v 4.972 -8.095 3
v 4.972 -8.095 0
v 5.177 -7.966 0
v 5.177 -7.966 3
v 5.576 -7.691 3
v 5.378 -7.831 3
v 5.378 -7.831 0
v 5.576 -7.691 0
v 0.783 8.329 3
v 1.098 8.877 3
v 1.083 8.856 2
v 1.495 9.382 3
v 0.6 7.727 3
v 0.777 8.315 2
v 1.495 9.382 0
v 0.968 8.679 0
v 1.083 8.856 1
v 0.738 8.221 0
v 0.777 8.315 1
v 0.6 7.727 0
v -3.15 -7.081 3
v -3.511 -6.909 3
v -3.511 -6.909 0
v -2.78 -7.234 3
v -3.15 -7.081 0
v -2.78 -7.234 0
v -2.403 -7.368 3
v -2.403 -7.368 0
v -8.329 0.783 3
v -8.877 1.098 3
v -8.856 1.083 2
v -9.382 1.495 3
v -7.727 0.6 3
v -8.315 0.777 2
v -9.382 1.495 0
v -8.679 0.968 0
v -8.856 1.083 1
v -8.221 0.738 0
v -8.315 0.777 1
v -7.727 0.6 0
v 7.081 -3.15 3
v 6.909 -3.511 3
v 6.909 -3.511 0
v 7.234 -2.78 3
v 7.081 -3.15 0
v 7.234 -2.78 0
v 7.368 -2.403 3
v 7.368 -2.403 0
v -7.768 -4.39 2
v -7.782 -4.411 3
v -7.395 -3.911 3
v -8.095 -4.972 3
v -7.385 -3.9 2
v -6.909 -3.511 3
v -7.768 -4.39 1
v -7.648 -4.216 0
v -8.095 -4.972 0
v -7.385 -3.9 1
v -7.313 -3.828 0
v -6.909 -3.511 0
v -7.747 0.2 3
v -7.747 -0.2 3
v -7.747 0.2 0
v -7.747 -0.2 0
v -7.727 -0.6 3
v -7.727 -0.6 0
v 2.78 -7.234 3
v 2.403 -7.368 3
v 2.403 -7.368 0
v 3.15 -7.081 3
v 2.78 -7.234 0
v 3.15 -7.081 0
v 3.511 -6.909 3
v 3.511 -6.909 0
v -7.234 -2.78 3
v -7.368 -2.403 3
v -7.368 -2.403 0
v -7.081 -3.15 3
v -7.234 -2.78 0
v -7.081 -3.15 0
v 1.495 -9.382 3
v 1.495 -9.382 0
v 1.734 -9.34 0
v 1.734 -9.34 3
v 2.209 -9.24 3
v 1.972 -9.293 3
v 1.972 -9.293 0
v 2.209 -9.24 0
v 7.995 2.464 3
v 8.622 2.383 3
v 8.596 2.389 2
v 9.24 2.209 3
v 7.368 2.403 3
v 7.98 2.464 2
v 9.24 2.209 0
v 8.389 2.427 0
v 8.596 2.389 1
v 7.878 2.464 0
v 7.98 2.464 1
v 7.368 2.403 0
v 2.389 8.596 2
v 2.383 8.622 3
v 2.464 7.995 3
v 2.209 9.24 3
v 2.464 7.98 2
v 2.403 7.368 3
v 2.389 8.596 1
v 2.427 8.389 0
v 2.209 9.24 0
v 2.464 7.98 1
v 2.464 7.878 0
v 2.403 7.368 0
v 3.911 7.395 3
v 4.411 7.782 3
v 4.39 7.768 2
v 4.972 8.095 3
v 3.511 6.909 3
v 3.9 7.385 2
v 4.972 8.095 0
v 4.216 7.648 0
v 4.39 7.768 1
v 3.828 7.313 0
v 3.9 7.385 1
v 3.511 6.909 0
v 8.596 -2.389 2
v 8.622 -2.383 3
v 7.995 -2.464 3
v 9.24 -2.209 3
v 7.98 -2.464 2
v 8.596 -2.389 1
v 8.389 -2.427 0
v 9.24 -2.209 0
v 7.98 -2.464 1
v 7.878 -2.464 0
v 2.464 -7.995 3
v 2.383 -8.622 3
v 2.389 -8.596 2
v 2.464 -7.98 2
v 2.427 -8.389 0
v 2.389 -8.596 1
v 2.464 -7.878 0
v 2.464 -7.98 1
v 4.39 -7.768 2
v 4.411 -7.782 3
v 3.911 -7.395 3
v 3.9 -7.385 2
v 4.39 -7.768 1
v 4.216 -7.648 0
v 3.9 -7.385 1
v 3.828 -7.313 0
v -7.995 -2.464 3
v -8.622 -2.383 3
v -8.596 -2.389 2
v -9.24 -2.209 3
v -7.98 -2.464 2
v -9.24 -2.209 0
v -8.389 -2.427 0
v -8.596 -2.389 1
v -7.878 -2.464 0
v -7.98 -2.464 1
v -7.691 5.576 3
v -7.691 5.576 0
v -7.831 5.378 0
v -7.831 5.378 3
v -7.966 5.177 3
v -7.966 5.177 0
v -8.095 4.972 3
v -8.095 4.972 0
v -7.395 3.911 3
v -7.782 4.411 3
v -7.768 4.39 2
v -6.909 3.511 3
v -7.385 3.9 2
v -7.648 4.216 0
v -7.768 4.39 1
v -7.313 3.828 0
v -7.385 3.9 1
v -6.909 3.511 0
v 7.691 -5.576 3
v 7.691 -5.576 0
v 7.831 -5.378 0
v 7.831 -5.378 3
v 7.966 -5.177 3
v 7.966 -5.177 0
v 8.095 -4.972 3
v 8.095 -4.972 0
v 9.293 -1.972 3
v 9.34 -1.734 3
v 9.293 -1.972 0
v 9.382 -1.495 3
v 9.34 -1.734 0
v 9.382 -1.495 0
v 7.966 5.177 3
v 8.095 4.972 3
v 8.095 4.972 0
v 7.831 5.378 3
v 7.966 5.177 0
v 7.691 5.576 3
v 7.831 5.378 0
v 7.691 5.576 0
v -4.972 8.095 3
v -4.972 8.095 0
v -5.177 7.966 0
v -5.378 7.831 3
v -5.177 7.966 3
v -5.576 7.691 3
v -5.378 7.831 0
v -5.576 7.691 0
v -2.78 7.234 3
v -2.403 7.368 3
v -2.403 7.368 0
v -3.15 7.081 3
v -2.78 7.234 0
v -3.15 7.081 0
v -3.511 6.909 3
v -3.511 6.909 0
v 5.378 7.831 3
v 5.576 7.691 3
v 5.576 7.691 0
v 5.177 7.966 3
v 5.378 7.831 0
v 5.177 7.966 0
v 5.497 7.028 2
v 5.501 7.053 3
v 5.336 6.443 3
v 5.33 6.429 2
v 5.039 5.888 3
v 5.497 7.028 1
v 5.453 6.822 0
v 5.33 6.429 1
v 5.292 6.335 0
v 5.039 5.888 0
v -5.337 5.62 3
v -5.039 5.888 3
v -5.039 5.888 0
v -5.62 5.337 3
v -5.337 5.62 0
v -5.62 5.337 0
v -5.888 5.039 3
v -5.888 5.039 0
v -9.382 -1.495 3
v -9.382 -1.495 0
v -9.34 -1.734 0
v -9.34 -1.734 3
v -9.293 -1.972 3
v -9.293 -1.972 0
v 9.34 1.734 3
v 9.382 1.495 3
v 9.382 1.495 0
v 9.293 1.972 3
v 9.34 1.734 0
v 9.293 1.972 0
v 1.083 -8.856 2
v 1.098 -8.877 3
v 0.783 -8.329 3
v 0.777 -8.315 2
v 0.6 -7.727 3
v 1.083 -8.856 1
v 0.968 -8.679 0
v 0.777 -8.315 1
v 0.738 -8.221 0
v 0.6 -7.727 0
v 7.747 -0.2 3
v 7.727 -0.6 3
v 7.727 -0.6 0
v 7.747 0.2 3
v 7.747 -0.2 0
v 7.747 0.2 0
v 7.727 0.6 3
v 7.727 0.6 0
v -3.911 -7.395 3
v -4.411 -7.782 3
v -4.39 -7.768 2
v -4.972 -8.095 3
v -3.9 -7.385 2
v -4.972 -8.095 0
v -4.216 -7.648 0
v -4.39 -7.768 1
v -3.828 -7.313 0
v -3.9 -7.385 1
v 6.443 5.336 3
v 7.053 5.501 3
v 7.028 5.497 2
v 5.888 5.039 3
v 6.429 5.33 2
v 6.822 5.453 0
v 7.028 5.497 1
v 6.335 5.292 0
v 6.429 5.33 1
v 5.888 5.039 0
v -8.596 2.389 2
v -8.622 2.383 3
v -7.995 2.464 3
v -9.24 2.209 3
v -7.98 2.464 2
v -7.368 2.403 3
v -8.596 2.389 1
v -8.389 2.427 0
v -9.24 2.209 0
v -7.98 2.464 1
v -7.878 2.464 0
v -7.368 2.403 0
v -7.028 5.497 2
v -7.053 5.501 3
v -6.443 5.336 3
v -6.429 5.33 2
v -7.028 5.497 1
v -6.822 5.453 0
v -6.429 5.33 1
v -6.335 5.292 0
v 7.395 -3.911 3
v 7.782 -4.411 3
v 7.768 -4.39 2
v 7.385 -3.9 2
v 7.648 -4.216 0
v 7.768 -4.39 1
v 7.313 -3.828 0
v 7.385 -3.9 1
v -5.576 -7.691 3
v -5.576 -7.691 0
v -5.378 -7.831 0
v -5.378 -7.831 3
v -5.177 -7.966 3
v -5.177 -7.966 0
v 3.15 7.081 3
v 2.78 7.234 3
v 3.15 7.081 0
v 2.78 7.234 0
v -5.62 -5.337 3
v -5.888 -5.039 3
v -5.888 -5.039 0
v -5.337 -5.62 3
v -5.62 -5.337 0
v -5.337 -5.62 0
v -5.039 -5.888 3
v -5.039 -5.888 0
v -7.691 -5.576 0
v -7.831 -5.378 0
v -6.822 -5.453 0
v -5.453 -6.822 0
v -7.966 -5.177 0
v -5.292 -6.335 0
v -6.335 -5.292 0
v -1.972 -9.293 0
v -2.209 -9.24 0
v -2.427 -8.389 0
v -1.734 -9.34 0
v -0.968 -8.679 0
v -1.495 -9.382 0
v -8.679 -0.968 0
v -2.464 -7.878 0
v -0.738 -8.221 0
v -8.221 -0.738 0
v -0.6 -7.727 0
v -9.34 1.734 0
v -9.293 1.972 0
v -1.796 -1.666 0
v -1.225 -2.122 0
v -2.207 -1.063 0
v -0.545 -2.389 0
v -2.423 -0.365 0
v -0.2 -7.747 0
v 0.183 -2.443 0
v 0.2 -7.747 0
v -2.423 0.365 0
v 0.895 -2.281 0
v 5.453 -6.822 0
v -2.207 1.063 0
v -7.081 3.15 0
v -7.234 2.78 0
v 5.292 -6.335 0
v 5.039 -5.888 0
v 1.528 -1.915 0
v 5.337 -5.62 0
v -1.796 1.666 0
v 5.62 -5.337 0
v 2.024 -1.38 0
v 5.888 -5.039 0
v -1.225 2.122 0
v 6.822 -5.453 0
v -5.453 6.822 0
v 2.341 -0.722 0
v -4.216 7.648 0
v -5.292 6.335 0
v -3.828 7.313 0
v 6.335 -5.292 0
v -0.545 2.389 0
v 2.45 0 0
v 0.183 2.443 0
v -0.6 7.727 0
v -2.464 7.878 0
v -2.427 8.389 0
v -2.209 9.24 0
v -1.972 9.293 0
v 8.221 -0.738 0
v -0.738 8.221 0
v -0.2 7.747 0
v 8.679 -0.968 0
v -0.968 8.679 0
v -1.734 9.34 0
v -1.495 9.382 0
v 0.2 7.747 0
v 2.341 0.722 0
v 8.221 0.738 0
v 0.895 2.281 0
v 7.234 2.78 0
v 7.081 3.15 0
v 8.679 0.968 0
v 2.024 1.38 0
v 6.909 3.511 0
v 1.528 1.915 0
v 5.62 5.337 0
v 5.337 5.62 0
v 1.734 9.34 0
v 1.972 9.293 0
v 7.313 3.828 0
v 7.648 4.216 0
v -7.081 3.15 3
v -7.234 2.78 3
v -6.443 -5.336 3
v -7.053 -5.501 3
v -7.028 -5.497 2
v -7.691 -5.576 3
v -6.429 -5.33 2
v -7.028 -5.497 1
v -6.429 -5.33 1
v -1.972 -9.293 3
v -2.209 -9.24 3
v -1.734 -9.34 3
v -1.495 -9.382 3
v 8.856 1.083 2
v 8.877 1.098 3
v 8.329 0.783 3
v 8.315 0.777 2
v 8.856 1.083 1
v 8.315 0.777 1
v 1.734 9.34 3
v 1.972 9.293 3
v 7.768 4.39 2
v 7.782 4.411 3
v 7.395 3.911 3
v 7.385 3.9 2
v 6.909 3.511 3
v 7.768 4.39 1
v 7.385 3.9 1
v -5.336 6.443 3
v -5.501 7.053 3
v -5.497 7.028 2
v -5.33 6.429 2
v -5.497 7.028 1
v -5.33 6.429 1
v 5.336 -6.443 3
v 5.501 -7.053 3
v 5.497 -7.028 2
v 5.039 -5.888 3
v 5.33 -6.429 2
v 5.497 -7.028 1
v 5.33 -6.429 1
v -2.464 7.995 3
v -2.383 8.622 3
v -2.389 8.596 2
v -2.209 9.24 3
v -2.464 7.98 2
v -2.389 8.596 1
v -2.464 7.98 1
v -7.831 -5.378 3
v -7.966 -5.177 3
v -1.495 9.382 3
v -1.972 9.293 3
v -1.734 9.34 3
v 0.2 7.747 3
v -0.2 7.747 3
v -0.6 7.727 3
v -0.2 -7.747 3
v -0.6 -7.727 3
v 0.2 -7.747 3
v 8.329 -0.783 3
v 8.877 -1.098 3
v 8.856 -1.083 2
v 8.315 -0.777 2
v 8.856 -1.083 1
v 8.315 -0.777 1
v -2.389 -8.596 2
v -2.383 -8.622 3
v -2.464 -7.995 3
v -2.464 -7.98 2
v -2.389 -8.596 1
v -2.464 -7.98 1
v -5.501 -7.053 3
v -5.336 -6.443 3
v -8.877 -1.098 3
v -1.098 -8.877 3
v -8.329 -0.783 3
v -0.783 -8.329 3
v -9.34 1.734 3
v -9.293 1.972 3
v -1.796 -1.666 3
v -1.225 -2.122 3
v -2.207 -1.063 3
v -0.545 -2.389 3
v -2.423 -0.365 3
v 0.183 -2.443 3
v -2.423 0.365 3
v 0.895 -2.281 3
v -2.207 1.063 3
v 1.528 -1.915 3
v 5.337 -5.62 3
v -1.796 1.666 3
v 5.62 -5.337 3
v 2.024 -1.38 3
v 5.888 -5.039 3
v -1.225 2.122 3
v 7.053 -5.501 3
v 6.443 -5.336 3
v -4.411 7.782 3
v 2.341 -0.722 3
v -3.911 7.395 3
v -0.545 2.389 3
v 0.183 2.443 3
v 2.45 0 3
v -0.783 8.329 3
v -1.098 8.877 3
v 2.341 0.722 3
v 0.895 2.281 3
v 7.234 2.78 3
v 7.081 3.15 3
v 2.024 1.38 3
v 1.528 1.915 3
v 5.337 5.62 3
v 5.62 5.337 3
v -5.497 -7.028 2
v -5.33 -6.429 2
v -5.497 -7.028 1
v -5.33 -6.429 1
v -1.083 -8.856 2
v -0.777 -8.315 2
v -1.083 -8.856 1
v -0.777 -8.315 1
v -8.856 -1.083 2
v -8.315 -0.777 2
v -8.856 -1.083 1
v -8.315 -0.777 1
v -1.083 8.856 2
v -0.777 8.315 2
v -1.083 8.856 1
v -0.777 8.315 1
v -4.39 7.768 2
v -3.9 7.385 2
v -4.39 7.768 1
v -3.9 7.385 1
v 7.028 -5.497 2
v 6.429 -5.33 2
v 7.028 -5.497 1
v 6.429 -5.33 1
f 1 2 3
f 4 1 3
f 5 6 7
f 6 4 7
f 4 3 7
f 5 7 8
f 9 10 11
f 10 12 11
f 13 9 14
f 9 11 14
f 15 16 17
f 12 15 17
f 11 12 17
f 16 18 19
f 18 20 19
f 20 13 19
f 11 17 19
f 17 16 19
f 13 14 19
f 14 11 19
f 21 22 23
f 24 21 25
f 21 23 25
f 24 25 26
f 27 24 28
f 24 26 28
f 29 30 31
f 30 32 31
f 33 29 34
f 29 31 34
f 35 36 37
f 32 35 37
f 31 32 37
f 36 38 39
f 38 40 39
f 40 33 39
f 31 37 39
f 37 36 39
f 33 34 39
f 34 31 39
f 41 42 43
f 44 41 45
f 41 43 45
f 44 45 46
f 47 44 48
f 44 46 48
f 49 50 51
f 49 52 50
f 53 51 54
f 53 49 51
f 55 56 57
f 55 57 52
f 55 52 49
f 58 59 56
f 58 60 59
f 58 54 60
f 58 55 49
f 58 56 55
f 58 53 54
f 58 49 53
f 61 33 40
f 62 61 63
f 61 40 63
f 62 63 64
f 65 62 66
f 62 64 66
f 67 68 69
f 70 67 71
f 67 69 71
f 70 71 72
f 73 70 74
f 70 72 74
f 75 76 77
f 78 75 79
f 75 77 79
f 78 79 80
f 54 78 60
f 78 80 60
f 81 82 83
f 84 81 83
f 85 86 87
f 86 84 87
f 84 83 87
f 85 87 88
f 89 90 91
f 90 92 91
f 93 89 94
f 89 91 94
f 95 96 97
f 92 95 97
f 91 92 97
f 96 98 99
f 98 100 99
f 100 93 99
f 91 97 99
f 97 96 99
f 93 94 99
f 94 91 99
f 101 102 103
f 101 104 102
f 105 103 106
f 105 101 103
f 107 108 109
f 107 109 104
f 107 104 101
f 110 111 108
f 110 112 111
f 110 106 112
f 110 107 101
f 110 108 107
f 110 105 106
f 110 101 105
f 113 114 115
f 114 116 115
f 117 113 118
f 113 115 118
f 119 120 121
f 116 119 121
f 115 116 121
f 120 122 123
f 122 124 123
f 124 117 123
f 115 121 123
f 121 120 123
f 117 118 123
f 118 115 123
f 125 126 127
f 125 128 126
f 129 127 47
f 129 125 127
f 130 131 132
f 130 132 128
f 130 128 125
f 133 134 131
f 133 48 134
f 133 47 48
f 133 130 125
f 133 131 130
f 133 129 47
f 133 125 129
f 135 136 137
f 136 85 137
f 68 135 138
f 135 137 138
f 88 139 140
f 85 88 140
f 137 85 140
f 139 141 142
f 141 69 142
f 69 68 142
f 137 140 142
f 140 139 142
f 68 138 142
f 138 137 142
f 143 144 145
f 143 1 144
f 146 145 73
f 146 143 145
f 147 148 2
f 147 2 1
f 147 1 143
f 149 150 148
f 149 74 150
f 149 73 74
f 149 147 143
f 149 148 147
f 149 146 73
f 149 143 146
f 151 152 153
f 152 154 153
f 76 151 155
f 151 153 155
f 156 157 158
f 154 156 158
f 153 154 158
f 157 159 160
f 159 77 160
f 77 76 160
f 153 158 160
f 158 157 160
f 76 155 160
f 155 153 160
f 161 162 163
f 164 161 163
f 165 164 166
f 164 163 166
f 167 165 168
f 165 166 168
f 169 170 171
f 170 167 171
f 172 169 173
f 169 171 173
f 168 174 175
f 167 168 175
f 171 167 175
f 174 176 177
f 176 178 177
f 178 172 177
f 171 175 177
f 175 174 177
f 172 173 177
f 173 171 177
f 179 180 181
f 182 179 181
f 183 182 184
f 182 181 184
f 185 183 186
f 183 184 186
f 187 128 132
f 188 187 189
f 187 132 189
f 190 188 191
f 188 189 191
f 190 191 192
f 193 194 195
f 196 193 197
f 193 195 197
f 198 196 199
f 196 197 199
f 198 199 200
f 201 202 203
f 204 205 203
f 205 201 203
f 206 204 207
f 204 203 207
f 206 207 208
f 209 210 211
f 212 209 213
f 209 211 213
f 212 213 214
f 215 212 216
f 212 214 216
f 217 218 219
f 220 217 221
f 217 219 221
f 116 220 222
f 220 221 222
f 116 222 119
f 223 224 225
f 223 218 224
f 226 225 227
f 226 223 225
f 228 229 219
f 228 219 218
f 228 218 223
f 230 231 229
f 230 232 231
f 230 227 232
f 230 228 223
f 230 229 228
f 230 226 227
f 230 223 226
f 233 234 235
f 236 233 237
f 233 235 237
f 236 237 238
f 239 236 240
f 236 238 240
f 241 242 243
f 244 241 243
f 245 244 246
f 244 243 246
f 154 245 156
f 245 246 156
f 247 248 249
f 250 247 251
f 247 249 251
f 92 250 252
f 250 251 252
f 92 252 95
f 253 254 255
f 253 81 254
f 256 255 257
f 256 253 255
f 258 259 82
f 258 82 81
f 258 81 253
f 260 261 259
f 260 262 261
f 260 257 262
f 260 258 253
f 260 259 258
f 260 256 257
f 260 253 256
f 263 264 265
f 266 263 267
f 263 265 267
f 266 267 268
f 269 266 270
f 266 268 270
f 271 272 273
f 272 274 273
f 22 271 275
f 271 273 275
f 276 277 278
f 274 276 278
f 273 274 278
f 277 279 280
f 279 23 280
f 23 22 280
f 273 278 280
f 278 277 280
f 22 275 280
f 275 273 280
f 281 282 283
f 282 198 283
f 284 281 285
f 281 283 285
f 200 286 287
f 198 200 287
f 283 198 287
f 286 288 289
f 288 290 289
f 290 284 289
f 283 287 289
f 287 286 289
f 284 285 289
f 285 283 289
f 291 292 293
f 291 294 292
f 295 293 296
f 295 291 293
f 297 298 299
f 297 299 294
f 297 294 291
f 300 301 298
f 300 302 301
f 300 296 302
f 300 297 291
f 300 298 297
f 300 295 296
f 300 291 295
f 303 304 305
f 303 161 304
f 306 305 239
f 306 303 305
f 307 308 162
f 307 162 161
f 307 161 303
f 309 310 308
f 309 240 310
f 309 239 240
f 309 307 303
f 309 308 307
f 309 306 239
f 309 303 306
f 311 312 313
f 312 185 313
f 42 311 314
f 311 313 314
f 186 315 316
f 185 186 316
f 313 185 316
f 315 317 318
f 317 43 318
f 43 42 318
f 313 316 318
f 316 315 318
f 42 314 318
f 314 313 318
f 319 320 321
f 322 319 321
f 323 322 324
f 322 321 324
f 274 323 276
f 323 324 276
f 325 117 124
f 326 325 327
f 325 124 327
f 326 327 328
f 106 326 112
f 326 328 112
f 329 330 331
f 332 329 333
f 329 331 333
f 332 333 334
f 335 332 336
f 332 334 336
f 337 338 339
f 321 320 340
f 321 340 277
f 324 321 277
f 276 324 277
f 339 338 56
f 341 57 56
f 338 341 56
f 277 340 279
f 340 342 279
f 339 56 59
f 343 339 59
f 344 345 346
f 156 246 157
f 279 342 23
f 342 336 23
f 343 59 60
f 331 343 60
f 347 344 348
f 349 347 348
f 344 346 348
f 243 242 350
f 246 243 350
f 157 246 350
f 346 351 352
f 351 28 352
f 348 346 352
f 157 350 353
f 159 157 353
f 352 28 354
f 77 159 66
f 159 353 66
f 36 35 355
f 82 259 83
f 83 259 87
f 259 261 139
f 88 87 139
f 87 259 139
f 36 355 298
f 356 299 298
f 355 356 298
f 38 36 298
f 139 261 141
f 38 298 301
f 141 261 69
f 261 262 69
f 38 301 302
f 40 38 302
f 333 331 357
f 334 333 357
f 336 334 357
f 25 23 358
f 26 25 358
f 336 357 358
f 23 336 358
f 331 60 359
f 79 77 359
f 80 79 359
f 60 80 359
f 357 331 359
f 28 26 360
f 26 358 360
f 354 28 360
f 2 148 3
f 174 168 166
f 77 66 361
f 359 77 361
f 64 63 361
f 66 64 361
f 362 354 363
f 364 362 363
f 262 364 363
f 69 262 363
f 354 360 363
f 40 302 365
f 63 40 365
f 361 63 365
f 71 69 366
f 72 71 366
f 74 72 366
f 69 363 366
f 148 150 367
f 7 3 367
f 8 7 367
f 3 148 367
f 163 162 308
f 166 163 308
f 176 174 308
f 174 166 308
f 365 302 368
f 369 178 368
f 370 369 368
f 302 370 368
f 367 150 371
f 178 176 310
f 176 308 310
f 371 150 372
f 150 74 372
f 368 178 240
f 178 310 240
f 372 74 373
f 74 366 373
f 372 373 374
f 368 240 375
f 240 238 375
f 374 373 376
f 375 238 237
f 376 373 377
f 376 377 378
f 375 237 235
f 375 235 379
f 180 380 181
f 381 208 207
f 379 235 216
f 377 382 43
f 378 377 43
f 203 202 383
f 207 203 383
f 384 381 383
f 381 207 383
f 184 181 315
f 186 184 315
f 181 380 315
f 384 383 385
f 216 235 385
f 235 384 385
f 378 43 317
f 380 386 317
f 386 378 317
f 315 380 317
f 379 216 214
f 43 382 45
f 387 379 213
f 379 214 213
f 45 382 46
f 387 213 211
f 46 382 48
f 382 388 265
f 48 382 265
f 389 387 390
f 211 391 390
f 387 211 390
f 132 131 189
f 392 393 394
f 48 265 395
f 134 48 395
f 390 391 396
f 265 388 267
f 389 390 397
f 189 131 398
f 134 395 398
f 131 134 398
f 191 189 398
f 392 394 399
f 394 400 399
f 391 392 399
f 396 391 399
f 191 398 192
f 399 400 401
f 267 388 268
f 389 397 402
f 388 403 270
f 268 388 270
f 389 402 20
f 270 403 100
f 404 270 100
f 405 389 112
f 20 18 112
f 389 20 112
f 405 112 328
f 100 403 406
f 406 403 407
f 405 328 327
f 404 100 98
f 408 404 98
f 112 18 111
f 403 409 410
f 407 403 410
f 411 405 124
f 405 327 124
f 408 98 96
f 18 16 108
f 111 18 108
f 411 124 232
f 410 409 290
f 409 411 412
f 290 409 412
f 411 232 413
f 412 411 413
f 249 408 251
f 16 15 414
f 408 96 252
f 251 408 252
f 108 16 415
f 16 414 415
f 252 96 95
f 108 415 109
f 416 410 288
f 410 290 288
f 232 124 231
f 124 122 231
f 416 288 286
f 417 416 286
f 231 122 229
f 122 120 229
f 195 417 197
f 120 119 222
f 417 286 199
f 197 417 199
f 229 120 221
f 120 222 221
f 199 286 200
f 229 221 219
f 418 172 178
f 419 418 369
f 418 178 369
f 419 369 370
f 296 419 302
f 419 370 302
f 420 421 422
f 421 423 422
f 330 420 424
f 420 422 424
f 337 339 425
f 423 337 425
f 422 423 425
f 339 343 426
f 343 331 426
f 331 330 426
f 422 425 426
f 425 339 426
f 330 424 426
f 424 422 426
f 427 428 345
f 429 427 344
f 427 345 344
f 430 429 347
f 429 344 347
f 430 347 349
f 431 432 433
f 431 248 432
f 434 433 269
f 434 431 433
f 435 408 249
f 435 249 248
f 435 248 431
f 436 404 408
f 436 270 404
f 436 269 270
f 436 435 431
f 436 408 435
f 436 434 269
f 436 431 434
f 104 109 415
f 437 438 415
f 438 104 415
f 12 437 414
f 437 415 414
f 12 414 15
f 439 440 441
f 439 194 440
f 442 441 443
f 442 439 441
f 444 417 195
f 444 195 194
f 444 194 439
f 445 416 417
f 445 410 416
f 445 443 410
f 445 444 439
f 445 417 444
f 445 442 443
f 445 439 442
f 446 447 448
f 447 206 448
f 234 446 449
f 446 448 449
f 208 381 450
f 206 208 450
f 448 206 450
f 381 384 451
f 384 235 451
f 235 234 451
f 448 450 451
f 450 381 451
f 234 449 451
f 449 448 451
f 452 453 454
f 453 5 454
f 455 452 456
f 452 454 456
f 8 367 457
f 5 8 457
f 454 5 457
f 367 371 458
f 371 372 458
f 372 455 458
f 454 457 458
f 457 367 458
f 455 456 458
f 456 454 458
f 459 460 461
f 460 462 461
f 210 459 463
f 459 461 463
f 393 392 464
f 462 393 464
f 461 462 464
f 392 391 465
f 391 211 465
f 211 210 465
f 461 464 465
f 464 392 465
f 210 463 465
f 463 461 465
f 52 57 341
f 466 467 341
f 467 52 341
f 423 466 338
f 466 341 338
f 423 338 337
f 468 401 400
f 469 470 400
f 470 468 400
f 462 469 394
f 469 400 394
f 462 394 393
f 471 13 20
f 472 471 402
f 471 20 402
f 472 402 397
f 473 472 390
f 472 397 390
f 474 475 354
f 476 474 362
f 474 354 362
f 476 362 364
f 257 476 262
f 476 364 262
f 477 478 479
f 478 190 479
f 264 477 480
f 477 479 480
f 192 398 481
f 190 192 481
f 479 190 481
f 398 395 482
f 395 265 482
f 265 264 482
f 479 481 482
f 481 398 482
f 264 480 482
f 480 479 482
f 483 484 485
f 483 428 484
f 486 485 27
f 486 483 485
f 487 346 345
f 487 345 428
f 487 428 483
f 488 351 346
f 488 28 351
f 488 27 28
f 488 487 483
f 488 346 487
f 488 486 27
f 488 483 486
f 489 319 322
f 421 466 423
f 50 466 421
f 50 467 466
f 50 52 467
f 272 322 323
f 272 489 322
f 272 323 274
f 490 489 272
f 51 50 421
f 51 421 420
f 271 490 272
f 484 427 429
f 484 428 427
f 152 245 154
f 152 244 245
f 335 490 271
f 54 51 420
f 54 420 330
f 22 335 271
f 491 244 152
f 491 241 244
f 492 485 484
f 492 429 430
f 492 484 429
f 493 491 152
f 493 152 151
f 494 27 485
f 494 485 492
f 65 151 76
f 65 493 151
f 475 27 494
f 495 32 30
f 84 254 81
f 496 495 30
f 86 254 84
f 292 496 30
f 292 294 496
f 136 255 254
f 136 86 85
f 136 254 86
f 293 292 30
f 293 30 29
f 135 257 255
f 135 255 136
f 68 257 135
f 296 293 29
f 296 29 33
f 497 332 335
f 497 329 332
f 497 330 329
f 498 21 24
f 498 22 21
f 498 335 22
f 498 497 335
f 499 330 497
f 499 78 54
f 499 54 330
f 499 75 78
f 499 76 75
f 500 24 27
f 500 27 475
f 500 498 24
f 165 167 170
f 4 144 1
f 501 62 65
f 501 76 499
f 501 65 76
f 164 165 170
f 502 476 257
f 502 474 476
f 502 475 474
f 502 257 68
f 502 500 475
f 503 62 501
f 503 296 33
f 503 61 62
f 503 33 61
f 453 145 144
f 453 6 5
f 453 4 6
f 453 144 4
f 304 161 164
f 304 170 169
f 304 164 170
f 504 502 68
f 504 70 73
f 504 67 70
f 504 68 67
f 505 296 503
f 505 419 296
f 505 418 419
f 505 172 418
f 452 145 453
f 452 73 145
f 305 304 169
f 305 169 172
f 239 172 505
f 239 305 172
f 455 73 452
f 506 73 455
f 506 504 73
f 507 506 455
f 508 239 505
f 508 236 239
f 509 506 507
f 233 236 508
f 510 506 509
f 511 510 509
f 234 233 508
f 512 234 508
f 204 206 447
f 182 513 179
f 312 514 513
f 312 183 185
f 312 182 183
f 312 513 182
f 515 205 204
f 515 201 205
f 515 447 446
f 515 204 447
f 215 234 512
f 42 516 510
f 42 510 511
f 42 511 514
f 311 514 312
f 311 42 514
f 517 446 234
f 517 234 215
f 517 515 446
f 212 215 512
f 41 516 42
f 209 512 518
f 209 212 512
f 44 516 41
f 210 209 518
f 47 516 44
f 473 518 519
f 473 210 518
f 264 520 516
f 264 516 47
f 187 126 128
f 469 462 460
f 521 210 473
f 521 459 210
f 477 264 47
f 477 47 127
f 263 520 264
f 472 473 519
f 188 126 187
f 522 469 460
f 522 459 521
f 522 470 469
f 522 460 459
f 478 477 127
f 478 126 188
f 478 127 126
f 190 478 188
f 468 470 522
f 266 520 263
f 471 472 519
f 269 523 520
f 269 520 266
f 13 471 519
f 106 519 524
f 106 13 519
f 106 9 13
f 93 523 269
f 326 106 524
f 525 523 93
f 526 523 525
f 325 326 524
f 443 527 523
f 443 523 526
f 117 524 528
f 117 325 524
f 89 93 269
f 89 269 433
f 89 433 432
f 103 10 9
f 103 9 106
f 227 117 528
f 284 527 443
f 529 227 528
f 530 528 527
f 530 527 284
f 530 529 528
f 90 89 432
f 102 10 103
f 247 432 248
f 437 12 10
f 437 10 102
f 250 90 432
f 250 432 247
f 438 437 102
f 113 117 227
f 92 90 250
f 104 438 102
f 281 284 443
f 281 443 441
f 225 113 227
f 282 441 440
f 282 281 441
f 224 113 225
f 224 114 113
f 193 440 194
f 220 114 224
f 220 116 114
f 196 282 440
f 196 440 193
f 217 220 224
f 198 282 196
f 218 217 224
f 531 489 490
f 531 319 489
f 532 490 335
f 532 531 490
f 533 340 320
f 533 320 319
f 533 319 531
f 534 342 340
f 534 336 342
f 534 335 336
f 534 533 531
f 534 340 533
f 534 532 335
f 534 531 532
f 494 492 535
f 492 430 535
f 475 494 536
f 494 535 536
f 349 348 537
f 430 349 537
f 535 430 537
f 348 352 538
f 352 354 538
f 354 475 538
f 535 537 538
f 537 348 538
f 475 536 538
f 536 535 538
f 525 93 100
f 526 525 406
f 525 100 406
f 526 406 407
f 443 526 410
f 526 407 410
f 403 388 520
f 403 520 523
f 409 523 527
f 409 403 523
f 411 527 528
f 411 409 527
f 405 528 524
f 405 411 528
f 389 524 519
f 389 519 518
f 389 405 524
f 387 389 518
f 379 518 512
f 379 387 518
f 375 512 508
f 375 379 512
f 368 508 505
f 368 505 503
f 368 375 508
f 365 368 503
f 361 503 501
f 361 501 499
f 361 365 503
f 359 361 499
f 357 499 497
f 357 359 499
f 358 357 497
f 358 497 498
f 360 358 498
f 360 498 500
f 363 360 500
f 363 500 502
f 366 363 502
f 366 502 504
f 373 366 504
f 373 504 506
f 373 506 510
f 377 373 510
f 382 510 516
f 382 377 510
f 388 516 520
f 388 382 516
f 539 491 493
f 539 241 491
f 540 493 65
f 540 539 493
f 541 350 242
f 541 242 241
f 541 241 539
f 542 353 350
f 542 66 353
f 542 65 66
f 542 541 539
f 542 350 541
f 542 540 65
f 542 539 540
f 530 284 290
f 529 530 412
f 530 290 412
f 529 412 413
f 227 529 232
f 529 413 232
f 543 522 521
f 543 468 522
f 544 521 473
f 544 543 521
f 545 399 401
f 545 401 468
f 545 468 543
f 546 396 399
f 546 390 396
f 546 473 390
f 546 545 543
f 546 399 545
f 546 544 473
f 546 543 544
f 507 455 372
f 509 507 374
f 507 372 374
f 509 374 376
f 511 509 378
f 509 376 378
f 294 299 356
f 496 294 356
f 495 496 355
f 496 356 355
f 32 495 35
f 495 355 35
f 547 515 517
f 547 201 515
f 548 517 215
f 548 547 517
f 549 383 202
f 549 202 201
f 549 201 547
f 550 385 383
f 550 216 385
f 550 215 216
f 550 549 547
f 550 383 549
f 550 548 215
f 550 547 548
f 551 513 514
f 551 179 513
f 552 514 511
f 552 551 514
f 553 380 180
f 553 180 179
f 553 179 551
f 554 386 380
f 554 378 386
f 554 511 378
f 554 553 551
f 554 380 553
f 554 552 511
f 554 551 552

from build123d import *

# Parameters (mm, degrees)
SKETCH1_R           = 9.5
SKETCH1_R_2         = 2.45
BOSS_EXTRUDE1_DEPTH = 3
CUT_EXTRUDE1_DEPTH  = 10
CIRPATTERN1_COUNT   = 16


with BuildPart() as part:
    # Sketch1 → Boss-Extrude1 (new body)
    with BuildSketch(Plane.XY):
        Circle(SKETCH1_R)
        Circle(SKETCH1_R_2, mode=Mode.SUBTRACT)
    extrude(amount=BOSS_EXTRUDE1_DEPTH)

    # Sketch6 → Cut-Extrude1 (cut)
    with BuildSketch(Plane(origin=(0, 0, 0), x_dir=(-1, 0, 0), z_dir=(0, 0, -1))):
        with BuildLine():
            ThreePointArc((-0.6, 7.726739286), (0, 7.75), (0.6, 7.726739286))
            add(Edge.make_bspline(
                [(1.495318178, 9.381578947), (1.036824569, 8.853460115), (0.705300974, 8.349634332), (0.6, 7.726739286)],
                knots=[0, 0, 0, 0, 1, 1, 1, 1], degree=3))
            ThreePointArc((1.495318178, 9.381578947), (0, 9.5), (-1.495318178, 9.381578947))
            add(Edge.make_bspline(
                [(-1.495318178, 9.381578947), (-1.036824569, 8.853460115), (-0.705300974, 8.349634332), (-0.6, 7.726739286)],
                knots=[0, 0, 0, 0, 1, 1, 1, 1], degree=3))
        make_face()
    cut_extrude1 = extrude(amount=-CUT_EXTRUDE1_DEPTH, mode=Mode.SUBTRACT)

    # CirPattern1: Cut-Extrude1 ×16 about axis
    cirpattern1_axis = Axis((0, 0, 0), (0, 0, 1))
    for i in range(1, CIRPATTERN1_COUNT):
        add(cut_extrude1.rotate(cirpattern1_axis, i * 360 / CIRPATTERN1_COUNT), mode=Mode.SUBTRACT)


solid = part.part
